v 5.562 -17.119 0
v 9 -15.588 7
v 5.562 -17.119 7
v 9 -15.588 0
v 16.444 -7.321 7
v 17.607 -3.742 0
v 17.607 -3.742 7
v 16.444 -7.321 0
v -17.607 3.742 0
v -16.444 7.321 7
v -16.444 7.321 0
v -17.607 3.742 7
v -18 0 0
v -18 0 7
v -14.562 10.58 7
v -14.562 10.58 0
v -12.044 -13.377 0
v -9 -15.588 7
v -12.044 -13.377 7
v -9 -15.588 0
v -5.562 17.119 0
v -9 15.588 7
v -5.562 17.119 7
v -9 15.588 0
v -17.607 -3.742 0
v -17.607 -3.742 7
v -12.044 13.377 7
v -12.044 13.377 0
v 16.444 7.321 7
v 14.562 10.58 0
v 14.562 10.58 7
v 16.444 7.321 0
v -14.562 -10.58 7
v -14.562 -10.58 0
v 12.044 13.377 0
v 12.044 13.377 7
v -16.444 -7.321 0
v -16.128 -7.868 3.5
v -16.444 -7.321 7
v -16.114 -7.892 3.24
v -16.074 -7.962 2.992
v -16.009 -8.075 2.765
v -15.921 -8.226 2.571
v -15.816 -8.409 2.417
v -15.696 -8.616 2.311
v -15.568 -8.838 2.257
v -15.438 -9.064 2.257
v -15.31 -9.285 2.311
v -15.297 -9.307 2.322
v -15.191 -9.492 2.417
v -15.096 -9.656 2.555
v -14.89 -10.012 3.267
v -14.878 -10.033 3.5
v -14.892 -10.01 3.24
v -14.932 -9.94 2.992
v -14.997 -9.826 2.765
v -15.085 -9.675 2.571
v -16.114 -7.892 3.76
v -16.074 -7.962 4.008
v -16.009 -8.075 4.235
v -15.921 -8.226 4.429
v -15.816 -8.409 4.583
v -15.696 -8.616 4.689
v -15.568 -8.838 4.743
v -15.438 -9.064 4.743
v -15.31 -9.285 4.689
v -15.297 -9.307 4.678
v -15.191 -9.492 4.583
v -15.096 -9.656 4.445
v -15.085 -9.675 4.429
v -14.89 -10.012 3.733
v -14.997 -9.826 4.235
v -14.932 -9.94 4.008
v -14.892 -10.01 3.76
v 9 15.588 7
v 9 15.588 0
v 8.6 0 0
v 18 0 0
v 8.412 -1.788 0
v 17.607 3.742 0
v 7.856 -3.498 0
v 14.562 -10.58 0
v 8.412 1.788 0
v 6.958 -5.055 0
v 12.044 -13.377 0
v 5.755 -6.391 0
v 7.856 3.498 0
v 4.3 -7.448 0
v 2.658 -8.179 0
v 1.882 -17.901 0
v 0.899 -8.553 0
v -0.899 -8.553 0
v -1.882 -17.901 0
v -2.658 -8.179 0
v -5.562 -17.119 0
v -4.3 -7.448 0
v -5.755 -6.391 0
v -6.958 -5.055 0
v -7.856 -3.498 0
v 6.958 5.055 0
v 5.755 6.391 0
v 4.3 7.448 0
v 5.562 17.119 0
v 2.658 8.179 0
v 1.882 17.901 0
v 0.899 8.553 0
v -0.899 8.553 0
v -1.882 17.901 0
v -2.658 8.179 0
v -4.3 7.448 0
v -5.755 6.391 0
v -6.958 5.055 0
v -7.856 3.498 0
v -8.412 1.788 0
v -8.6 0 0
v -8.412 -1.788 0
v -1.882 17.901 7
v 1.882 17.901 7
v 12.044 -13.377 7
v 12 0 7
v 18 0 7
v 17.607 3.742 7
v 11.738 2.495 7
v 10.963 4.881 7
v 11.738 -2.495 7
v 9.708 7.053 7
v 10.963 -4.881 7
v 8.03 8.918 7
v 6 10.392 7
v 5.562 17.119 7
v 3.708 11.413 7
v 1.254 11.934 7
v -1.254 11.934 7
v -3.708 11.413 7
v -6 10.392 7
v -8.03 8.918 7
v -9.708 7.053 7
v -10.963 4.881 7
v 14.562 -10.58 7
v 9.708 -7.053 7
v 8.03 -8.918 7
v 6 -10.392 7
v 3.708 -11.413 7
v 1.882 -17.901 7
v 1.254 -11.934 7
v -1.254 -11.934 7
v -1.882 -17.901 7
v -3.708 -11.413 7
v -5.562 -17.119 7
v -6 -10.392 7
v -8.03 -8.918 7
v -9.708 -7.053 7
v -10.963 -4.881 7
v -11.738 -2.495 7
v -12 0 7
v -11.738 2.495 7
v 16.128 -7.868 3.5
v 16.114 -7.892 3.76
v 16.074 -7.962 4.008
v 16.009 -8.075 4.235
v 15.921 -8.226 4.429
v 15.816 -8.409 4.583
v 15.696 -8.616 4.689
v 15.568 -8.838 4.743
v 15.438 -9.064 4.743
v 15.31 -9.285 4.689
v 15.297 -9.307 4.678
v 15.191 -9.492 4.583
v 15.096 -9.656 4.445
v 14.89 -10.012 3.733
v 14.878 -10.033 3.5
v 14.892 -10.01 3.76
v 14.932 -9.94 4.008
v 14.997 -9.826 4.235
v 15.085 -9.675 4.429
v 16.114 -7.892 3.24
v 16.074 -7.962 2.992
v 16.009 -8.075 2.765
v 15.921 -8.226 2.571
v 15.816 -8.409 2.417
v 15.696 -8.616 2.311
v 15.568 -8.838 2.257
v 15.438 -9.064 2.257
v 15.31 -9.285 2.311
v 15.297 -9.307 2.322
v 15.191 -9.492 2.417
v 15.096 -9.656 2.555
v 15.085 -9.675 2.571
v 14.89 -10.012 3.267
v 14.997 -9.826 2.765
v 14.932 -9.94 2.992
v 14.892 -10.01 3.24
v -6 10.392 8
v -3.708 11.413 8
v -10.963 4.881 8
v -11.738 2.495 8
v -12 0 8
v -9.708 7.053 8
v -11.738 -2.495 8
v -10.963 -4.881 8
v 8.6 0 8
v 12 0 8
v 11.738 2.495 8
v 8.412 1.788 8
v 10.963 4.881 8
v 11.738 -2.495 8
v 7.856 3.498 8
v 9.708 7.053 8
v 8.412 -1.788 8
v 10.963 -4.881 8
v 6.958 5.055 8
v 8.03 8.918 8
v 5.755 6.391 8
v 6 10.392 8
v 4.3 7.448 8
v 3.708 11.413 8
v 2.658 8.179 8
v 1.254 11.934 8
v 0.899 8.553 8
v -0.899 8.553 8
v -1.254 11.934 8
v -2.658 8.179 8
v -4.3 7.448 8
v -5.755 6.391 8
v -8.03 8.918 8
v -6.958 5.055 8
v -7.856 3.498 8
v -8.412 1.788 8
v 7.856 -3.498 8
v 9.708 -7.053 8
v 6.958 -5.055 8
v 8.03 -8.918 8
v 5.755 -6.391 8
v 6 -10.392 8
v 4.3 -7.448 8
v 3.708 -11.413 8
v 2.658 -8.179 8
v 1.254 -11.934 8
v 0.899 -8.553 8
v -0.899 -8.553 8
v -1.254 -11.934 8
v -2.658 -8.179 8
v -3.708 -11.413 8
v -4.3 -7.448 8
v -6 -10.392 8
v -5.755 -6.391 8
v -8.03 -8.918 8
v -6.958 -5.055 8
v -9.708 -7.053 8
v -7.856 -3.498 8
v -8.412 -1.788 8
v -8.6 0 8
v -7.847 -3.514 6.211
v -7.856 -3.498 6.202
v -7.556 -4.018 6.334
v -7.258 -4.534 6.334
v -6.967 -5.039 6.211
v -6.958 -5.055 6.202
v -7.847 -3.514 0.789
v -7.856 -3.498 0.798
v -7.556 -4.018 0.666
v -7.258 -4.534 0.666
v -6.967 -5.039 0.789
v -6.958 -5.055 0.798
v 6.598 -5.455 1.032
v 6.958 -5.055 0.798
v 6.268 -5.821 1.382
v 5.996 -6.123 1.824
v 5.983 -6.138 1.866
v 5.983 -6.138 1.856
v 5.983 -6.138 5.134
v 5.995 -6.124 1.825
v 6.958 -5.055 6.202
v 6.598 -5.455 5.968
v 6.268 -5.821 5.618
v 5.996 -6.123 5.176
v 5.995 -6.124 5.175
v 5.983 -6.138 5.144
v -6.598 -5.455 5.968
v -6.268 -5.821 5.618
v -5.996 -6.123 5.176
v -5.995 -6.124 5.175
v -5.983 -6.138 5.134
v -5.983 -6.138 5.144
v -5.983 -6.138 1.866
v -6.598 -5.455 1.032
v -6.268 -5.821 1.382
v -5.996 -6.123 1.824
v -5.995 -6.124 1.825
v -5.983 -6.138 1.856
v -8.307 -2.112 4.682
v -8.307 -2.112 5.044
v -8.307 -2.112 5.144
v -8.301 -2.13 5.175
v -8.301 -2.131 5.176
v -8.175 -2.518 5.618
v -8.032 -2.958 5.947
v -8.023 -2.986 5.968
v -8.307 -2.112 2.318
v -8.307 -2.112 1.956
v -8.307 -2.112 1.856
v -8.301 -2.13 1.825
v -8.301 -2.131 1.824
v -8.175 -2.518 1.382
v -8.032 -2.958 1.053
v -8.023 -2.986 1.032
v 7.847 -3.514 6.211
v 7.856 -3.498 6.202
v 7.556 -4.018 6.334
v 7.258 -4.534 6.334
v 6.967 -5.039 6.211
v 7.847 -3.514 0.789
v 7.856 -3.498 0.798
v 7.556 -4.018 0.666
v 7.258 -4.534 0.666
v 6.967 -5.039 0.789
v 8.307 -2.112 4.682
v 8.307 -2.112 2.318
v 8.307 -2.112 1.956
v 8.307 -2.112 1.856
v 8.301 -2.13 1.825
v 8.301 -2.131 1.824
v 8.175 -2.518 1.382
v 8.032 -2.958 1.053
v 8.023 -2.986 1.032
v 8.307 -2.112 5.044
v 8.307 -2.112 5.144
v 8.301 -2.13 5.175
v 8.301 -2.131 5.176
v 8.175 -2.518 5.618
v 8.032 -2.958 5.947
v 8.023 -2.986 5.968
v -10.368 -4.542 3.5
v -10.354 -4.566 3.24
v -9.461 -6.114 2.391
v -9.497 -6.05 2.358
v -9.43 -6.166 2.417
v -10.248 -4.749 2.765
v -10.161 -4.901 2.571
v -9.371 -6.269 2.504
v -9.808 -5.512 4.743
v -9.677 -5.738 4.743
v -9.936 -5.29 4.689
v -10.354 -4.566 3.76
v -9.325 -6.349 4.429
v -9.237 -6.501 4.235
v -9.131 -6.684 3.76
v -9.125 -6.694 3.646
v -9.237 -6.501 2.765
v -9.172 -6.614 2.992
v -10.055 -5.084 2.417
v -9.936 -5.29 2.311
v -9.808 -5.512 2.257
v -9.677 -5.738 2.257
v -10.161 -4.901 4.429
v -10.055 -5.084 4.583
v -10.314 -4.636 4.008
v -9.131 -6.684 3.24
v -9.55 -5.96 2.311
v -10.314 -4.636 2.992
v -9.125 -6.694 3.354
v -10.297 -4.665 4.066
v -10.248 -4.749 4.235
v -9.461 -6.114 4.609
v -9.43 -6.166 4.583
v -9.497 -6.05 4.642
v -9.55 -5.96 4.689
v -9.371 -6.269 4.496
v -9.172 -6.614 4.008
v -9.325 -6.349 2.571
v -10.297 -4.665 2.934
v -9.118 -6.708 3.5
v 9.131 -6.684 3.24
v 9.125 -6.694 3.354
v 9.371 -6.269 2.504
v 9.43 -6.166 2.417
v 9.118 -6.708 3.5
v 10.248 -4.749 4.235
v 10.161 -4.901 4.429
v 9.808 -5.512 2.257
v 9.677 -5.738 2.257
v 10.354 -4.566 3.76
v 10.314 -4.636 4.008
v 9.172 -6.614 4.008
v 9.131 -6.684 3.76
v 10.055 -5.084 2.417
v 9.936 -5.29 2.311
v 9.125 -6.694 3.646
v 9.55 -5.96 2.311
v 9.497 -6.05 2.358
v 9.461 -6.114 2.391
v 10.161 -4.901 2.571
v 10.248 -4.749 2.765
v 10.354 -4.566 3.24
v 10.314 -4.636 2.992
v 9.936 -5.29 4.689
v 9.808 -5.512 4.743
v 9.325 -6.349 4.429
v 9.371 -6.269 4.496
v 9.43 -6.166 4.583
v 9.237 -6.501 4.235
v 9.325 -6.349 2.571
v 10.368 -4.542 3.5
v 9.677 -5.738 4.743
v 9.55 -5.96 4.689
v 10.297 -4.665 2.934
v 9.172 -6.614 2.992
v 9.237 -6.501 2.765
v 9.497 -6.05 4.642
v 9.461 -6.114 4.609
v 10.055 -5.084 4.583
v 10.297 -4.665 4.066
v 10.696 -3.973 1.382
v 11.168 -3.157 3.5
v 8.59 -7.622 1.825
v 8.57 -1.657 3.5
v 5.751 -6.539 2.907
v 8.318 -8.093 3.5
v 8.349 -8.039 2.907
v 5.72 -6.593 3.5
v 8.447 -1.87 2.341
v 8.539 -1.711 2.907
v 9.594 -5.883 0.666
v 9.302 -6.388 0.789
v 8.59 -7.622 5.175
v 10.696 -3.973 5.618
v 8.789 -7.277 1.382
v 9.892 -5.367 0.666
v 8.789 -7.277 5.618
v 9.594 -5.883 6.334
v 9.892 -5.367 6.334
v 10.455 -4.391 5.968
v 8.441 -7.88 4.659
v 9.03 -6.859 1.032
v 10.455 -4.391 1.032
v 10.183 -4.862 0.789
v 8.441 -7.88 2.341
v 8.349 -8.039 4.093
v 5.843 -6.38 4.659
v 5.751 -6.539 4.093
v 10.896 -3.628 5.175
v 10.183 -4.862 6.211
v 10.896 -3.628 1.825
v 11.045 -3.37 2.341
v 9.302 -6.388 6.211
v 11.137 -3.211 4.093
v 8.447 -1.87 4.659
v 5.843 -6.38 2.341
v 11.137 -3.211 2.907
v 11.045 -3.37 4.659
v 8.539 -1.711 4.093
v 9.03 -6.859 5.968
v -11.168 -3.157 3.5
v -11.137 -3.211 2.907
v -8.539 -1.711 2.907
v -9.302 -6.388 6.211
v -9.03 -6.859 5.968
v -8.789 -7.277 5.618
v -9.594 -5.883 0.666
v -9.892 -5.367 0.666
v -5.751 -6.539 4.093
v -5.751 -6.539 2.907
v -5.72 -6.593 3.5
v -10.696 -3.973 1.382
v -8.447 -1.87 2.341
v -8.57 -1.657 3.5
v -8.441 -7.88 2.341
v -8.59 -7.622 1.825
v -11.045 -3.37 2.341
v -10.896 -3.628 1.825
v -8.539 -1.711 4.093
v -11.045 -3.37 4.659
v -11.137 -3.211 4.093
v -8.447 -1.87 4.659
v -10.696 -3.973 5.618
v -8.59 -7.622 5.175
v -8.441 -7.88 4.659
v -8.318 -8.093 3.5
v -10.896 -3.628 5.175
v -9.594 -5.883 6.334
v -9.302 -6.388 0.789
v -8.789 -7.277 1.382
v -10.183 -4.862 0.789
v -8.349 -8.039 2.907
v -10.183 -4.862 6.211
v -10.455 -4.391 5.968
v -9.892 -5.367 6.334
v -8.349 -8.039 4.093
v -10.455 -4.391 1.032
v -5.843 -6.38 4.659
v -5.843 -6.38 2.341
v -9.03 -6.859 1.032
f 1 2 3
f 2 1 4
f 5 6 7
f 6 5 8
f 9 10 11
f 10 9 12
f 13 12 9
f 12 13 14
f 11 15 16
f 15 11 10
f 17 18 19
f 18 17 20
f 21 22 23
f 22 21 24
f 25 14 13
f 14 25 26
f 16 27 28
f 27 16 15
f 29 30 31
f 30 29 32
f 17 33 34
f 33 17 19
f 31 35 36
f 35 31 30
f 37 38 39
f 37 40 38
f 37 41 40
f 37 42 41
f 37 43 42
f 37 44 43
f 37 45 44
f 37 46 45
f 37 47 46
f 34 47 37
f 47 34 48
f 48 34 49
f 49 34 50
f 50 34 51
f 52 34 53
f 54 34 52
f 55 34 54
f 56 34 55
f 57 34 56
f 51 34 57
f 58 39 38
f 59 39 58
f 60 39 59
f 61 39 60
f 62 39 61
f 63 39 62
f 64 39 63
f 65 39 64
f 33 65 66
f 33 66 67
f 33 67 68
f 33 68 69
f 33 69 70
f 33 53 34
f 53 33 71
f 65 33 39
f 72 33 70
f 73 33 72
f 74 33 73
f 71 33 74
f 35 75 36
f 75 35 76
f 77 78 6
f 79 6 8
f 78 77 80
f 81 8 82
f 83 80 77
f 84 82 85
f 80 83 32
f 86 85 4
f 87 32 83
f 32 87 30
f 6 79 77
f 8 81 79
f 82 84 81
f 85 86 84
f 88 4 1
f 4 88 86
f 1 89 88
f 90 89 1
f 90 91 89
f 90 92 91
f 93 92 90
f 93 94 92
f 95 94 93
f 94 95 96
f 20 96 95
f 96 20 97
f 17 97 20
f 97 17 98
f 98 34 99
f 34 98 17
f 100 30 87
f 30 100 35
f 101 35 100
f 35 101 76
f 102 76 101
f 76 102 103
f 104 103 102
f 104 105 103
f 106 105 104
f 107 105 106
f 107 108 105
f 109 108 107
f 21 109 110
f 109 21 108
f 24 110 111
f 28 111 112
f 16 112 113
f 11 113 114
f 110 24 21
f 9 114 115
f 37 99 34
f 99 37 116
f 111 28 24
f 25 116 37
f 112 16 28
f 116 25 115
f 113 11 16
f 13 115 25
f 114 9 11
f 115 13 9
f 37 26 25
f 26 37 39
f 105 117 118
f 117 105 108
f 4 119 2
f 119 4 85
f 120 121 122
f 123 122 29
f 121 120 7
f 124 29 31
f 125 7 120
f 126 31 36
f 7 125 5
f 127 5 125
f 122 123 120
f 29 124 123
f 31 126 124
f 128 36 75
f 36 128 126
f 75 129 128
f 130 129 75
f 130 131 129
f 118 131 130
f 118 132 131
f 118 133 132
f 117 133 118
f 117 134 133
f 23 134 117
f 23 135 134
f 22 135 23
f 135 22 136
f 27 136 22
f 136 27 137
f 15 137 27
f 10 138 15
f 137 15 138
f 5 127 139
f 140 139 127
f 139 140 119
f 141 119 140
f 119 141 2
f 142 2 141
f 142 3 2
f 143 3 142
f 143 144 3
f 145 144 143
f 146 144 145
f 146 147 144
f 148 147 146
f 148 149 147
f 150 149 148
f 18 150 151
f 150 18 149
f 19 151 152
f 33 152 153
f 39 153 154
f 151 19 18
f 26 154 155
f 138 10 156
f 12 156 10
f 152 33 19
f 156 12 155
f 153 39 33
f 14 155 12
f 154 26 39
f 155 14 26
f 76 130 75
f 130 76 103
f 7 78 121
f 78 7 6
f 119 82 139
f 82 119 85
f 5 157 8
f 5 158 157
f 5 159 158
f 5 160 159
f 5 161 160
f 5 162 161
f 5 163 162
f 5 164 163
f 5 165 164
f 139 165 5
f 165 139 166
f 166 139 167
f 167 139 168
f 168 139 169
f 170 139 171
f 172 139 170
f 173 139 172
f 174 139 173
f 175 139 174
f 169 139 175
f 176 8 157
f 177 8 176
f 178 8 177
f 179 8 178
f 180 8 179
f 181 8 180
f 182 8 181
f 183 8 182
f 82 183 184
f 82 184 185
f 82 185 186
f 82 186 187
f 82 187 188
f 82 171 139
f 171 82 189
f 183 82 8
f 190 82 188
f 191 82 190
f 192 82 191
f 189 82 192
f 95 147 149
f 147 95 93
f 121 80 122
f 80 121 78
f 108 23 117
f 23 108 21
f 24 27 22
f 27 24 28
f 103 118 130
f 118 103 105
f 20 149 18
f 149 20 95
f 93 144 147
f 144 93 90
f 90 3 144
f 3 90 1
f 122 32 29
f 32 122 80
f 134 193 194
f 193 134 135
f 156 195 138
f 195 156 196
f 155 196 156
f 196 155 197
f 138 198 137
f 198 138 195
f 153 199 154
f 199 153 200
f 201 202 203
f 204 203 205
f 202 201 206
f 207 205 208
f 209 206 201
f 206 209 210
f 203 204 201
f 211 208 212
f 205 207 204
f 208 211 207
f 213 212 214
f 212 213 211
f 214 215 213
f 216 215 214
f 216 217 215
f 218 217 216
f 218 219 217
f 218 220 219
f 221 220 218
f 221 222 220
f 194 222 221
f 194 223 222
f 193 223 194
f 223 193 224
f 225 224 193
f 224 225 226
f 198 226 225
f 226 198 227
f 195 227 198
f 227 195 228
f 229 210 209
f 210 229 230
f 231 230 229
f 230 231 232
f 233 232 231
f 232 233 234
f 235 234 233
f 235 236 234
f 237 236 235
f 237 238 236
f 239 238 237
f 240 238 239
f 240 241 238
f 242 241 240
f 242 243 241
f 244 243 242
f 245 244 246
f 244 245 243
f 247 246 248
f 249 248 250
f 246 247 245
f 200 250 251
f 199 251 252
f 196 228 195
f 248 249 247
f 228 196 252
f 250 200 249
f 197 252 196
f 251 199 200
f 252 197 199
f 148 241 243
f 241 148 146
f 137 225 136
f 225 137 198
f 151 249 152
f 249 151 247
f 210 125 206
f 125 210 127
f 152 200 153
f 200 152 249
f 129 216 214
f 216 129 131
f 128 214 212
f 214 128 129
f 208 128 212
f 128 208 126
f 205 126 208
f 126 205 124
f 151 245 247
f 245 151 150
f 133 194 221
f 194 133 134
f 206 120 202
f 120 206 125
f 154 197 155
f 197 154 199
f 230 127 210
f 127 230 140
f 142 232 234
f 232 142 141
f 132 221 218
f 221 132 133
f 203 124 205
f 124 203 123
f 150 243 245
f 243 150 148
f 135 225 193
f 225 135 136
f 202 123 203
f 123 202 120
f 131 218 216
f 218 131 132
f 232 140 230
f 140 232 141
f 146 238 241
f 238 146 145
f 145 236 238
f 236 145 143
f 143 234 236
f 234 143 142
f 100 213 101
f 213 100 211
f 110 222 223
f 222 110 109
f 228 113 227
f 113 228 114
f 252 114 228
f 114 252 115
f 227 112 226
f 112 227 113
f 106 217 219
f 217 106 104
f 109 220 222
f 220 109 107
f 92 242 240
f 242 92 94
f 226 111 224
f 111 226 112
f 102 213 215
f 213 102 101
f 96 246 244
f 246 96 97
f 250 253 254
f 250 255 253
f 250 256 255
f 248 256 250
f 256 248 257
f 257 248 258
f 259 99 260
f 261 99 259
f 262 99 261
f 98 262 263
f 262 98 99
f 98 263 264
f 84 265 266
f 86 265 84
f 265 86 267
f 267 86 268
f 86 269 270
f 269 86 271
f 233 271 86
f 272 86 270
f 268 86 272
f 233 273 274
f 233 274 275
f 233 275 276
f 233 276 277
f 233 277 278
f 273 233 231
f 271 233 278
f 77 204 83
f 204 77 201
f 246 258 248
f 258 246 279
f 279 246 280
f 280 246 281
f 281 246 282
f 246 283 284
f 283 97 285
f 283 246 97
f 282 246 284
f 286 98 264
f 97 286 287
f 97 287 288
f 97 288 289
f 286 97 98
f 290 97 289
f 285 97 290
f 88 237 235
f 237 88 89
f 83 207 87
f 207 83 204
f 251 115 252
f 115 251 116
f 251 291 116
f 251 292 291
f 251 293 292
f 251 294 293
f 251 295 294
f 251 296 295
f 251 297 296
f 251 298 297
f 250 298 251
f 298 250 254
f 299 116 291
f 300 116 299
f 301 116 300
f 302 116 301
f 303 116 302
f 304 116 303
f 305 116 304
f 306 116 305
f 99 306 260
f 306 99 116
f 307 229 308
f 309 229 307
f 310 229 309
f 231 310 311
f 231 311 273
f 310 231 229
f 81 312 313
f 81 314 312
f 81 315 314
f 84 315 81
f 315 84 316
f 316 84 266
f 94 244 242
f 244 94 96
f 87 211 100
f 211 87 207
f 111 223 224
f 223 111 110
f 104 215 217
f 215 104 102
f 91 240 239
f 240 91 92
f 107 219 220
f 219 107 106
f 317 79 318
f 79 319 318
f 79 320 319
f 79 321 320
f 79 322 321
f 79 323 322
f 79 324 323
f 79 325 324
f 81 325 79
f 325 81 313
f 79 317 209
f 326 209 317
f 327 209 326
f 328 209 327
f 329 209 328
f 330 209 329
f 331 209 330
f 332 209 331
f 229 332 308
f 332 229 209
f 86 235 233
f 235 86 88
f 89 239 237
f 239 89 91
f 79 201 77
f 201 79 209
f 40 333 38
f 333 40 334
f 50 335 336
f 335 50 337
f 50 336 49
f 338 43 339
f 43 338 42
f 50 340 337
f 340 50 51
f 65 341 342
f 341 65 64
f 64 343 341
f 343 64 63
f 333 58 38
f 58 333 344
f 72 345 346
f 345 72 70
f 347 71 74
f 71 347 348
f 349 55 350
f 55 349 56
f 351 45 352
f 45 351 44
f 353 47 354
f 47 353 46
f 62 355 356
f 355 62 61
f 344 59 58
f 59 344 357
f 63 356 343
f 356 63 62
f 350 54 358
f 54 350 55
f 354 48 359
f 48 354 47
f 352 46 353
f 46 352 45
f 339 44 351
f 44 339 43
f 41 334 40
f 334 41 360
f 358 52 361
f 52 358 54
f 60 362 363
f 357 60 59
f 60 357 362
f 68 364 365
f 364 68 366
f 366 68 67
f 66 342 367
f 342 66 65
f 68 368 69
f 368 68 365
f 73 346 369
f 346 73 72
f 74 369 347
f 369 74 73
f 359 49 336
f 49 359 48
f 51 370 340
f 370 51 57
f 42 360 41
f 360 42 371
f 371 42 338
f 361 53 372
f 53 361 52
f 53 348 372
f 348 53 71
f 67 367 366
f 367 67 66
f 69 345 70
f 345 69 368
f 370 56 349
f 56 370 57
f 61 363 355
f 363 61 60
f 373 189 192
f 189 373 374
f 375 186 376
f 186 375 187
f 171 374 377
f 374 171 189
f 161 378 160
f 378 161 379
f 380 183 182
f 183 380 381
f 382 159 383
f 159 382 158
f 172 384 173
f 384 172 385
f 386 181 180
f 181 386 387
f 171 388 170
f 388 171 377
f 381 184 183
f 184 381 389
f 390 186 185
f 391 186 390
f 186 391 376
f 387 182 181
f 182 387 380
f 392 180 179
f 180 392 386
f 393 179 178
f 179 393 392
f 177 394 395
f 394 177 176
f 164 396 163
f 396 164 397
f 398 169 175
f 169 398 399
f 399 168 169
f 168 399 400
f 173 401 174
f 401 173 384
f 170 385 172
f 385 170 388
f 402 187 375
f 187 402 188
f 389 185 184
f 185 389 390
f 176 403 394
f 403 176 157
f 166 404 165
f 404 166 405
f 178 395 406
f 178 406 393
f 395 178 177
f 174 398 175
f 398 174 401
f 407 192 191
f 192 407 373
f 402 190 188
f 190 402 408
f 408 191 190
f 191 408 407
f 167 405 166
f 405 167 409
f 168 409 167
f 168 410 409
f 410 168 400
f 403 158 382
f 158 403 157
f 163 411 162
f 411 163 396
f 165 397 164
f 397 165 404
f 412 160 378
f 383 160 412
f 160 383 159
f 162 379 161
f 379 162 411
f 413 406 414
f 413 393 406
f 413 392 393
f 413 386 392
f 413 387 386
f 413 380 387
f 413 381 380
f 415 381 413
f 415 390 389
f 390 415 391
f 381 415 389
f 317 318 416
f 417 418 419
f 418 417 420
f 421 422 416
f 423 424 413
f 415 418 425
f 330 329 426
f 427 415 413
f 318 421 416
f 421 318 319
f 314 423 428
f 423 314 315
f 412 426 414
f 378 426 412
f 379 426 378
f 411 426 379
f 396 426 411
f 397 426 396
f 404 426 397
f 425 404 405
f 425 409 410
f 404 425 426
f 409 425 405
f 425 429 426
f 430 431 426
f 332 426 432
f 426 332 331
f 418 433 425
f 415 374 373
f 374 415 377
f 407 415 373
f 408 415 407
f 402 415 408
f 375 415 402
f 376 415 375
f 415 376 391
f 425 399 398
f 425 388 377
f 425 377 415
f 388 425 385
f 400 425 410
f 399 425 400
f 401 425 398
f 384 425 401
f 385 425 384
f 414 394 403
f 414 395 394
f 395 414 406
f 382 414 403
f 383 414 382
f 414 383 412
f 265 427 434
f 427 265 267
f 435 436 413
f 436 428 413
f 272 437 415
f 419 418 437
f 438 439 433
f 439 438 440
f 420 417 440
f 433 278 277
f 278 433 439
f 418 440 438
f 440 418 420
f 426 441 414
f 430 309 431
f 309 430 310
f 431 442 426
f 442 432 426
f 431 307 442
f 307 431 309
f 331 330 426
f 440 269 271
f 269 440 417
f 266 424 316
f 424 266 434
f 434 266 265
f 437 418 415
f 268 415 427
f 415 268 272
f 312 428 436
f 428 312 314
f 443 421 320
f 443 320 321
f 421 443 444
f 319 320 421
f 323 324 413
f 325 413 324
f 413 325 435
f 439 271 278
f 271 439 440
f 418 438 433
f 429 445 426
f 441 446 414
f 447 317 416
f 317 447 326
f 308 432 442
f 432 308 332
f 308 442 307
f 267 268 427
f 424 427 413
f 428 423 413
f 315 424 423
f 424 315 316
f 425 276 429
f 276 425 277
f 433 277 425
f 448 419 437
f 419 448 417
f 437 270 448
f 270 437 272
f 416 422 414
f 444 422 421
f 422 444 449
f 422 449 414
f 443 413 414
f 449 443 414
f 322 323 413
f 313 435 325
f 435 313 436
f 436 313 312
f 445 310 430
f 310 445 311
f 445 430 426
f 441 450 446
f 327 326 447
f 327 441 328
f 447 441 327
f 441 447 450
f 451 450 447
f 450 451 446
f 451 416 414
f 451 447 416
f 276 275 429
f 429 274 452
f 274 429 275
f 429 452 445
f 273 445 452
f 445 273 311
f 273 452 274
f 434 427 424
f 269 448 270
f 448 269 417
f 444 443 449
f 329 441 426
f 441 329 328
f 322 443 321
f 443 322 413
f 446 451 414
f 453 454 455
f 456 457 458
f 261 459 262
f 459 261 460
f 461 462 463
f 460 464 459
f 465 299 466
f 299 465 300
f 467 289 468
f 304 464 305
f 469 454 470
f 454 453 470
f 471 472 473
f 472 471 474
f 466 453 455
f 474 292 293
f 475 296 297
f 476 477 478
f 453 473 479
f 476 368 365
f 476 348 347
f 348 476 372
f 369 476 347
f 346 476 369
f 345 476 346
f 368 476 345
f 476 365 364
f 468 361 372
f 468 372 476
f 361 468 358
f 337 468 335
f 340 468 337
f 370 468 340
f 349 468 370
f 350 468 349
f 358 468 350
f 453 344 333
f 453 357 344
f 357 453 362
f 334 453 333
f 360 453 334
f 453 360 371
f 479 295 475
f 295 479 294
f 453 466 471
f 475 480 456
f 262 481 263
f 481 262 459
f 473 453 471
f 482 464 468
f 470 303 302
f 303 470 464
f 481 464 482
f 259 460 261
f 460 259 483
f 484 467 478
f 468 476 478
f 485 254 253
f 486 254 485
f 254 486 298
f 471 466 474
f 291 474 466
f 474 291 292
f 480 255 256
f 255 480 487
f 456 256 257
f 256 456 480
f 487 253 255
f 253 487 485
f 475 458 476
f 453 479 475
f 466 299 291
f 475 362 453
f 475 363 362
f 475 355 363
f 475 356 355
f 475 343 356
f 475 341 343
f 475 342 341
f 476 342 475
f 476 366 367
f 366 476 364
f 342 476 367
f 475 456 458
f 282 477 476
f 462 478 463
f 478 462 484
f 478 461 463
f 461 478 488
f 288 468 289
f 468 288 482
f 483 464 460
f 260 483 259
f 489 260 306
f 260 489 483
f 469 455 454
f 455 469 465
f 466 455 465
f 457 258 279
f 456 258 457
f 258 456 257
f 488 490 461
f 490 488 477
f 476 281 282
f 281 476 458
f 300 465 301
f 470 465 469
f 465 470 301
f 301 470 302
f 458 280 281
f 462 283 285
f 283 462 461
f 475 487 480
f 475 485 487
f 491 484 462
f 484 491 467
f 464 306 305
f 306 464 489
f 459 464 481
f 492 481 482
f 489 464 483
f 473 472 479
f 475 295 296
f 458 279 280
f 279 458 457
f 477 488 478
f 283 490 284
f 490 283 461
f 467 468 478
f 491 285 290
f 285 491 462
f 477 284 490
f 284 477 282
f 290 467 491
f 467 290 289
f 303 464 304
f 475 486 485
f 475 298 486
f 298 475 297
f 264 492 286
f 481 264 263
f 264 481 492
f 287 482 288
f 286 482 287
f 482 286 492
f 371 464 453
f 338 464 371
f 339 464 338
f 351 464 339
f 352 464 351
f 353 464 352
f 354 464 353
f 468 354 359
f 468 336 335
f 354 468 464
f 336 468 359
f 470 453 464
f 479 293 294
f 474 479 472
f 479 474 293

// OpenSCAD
// Basic gondola stabilizer and platform for a polargraph
//
// Created by Walter Anderson on June 3, 2014
// Version 1.0.3 modified on June 19, 2004
$fs=0.01;

translate([0,0,49]) rotate(a=[0,180,0]) difference() {
	union() {
		translate([0,0,42])
			cylinder(h=7, r=18);
		translate([0,0,41])
			cylinder(h=1, r=12);
	}
	// This creates a central 13mm hole that just holds the pen, no brass tube
	cylinder(h=75, r=8.6);
	// This creates two holes that can be used in the clamp piece (needed only for 
	// gondola that doesn't use the central brass tube
	rotate(a=[0,0,60])
		translate([0,-10,45.5])
			rotate(a=[90,0,0])
				cylinder(h=20, r=1.25, center = true);
	rotate(a=[0,0,-60])
		translate([0,-10,45.5])
			rotate(a=[90,0,0])
				cylinder(h=20, r=1.25, center = true);
	// This creates recesses on the inside if you wish to add a nut
	rotate(a=[0,0,-60])
		translate([0,-9.75,45.5])
			rotate(a=[90,0,0])
				cylinder(h=3, r=2.85, center = true);
	rotate(a=[0,0,60])
		translate([0,-9.75,45.5])
			rotate(a=[90,0,0])
				cylinder(h=3, r=2.85, center = true);
}
